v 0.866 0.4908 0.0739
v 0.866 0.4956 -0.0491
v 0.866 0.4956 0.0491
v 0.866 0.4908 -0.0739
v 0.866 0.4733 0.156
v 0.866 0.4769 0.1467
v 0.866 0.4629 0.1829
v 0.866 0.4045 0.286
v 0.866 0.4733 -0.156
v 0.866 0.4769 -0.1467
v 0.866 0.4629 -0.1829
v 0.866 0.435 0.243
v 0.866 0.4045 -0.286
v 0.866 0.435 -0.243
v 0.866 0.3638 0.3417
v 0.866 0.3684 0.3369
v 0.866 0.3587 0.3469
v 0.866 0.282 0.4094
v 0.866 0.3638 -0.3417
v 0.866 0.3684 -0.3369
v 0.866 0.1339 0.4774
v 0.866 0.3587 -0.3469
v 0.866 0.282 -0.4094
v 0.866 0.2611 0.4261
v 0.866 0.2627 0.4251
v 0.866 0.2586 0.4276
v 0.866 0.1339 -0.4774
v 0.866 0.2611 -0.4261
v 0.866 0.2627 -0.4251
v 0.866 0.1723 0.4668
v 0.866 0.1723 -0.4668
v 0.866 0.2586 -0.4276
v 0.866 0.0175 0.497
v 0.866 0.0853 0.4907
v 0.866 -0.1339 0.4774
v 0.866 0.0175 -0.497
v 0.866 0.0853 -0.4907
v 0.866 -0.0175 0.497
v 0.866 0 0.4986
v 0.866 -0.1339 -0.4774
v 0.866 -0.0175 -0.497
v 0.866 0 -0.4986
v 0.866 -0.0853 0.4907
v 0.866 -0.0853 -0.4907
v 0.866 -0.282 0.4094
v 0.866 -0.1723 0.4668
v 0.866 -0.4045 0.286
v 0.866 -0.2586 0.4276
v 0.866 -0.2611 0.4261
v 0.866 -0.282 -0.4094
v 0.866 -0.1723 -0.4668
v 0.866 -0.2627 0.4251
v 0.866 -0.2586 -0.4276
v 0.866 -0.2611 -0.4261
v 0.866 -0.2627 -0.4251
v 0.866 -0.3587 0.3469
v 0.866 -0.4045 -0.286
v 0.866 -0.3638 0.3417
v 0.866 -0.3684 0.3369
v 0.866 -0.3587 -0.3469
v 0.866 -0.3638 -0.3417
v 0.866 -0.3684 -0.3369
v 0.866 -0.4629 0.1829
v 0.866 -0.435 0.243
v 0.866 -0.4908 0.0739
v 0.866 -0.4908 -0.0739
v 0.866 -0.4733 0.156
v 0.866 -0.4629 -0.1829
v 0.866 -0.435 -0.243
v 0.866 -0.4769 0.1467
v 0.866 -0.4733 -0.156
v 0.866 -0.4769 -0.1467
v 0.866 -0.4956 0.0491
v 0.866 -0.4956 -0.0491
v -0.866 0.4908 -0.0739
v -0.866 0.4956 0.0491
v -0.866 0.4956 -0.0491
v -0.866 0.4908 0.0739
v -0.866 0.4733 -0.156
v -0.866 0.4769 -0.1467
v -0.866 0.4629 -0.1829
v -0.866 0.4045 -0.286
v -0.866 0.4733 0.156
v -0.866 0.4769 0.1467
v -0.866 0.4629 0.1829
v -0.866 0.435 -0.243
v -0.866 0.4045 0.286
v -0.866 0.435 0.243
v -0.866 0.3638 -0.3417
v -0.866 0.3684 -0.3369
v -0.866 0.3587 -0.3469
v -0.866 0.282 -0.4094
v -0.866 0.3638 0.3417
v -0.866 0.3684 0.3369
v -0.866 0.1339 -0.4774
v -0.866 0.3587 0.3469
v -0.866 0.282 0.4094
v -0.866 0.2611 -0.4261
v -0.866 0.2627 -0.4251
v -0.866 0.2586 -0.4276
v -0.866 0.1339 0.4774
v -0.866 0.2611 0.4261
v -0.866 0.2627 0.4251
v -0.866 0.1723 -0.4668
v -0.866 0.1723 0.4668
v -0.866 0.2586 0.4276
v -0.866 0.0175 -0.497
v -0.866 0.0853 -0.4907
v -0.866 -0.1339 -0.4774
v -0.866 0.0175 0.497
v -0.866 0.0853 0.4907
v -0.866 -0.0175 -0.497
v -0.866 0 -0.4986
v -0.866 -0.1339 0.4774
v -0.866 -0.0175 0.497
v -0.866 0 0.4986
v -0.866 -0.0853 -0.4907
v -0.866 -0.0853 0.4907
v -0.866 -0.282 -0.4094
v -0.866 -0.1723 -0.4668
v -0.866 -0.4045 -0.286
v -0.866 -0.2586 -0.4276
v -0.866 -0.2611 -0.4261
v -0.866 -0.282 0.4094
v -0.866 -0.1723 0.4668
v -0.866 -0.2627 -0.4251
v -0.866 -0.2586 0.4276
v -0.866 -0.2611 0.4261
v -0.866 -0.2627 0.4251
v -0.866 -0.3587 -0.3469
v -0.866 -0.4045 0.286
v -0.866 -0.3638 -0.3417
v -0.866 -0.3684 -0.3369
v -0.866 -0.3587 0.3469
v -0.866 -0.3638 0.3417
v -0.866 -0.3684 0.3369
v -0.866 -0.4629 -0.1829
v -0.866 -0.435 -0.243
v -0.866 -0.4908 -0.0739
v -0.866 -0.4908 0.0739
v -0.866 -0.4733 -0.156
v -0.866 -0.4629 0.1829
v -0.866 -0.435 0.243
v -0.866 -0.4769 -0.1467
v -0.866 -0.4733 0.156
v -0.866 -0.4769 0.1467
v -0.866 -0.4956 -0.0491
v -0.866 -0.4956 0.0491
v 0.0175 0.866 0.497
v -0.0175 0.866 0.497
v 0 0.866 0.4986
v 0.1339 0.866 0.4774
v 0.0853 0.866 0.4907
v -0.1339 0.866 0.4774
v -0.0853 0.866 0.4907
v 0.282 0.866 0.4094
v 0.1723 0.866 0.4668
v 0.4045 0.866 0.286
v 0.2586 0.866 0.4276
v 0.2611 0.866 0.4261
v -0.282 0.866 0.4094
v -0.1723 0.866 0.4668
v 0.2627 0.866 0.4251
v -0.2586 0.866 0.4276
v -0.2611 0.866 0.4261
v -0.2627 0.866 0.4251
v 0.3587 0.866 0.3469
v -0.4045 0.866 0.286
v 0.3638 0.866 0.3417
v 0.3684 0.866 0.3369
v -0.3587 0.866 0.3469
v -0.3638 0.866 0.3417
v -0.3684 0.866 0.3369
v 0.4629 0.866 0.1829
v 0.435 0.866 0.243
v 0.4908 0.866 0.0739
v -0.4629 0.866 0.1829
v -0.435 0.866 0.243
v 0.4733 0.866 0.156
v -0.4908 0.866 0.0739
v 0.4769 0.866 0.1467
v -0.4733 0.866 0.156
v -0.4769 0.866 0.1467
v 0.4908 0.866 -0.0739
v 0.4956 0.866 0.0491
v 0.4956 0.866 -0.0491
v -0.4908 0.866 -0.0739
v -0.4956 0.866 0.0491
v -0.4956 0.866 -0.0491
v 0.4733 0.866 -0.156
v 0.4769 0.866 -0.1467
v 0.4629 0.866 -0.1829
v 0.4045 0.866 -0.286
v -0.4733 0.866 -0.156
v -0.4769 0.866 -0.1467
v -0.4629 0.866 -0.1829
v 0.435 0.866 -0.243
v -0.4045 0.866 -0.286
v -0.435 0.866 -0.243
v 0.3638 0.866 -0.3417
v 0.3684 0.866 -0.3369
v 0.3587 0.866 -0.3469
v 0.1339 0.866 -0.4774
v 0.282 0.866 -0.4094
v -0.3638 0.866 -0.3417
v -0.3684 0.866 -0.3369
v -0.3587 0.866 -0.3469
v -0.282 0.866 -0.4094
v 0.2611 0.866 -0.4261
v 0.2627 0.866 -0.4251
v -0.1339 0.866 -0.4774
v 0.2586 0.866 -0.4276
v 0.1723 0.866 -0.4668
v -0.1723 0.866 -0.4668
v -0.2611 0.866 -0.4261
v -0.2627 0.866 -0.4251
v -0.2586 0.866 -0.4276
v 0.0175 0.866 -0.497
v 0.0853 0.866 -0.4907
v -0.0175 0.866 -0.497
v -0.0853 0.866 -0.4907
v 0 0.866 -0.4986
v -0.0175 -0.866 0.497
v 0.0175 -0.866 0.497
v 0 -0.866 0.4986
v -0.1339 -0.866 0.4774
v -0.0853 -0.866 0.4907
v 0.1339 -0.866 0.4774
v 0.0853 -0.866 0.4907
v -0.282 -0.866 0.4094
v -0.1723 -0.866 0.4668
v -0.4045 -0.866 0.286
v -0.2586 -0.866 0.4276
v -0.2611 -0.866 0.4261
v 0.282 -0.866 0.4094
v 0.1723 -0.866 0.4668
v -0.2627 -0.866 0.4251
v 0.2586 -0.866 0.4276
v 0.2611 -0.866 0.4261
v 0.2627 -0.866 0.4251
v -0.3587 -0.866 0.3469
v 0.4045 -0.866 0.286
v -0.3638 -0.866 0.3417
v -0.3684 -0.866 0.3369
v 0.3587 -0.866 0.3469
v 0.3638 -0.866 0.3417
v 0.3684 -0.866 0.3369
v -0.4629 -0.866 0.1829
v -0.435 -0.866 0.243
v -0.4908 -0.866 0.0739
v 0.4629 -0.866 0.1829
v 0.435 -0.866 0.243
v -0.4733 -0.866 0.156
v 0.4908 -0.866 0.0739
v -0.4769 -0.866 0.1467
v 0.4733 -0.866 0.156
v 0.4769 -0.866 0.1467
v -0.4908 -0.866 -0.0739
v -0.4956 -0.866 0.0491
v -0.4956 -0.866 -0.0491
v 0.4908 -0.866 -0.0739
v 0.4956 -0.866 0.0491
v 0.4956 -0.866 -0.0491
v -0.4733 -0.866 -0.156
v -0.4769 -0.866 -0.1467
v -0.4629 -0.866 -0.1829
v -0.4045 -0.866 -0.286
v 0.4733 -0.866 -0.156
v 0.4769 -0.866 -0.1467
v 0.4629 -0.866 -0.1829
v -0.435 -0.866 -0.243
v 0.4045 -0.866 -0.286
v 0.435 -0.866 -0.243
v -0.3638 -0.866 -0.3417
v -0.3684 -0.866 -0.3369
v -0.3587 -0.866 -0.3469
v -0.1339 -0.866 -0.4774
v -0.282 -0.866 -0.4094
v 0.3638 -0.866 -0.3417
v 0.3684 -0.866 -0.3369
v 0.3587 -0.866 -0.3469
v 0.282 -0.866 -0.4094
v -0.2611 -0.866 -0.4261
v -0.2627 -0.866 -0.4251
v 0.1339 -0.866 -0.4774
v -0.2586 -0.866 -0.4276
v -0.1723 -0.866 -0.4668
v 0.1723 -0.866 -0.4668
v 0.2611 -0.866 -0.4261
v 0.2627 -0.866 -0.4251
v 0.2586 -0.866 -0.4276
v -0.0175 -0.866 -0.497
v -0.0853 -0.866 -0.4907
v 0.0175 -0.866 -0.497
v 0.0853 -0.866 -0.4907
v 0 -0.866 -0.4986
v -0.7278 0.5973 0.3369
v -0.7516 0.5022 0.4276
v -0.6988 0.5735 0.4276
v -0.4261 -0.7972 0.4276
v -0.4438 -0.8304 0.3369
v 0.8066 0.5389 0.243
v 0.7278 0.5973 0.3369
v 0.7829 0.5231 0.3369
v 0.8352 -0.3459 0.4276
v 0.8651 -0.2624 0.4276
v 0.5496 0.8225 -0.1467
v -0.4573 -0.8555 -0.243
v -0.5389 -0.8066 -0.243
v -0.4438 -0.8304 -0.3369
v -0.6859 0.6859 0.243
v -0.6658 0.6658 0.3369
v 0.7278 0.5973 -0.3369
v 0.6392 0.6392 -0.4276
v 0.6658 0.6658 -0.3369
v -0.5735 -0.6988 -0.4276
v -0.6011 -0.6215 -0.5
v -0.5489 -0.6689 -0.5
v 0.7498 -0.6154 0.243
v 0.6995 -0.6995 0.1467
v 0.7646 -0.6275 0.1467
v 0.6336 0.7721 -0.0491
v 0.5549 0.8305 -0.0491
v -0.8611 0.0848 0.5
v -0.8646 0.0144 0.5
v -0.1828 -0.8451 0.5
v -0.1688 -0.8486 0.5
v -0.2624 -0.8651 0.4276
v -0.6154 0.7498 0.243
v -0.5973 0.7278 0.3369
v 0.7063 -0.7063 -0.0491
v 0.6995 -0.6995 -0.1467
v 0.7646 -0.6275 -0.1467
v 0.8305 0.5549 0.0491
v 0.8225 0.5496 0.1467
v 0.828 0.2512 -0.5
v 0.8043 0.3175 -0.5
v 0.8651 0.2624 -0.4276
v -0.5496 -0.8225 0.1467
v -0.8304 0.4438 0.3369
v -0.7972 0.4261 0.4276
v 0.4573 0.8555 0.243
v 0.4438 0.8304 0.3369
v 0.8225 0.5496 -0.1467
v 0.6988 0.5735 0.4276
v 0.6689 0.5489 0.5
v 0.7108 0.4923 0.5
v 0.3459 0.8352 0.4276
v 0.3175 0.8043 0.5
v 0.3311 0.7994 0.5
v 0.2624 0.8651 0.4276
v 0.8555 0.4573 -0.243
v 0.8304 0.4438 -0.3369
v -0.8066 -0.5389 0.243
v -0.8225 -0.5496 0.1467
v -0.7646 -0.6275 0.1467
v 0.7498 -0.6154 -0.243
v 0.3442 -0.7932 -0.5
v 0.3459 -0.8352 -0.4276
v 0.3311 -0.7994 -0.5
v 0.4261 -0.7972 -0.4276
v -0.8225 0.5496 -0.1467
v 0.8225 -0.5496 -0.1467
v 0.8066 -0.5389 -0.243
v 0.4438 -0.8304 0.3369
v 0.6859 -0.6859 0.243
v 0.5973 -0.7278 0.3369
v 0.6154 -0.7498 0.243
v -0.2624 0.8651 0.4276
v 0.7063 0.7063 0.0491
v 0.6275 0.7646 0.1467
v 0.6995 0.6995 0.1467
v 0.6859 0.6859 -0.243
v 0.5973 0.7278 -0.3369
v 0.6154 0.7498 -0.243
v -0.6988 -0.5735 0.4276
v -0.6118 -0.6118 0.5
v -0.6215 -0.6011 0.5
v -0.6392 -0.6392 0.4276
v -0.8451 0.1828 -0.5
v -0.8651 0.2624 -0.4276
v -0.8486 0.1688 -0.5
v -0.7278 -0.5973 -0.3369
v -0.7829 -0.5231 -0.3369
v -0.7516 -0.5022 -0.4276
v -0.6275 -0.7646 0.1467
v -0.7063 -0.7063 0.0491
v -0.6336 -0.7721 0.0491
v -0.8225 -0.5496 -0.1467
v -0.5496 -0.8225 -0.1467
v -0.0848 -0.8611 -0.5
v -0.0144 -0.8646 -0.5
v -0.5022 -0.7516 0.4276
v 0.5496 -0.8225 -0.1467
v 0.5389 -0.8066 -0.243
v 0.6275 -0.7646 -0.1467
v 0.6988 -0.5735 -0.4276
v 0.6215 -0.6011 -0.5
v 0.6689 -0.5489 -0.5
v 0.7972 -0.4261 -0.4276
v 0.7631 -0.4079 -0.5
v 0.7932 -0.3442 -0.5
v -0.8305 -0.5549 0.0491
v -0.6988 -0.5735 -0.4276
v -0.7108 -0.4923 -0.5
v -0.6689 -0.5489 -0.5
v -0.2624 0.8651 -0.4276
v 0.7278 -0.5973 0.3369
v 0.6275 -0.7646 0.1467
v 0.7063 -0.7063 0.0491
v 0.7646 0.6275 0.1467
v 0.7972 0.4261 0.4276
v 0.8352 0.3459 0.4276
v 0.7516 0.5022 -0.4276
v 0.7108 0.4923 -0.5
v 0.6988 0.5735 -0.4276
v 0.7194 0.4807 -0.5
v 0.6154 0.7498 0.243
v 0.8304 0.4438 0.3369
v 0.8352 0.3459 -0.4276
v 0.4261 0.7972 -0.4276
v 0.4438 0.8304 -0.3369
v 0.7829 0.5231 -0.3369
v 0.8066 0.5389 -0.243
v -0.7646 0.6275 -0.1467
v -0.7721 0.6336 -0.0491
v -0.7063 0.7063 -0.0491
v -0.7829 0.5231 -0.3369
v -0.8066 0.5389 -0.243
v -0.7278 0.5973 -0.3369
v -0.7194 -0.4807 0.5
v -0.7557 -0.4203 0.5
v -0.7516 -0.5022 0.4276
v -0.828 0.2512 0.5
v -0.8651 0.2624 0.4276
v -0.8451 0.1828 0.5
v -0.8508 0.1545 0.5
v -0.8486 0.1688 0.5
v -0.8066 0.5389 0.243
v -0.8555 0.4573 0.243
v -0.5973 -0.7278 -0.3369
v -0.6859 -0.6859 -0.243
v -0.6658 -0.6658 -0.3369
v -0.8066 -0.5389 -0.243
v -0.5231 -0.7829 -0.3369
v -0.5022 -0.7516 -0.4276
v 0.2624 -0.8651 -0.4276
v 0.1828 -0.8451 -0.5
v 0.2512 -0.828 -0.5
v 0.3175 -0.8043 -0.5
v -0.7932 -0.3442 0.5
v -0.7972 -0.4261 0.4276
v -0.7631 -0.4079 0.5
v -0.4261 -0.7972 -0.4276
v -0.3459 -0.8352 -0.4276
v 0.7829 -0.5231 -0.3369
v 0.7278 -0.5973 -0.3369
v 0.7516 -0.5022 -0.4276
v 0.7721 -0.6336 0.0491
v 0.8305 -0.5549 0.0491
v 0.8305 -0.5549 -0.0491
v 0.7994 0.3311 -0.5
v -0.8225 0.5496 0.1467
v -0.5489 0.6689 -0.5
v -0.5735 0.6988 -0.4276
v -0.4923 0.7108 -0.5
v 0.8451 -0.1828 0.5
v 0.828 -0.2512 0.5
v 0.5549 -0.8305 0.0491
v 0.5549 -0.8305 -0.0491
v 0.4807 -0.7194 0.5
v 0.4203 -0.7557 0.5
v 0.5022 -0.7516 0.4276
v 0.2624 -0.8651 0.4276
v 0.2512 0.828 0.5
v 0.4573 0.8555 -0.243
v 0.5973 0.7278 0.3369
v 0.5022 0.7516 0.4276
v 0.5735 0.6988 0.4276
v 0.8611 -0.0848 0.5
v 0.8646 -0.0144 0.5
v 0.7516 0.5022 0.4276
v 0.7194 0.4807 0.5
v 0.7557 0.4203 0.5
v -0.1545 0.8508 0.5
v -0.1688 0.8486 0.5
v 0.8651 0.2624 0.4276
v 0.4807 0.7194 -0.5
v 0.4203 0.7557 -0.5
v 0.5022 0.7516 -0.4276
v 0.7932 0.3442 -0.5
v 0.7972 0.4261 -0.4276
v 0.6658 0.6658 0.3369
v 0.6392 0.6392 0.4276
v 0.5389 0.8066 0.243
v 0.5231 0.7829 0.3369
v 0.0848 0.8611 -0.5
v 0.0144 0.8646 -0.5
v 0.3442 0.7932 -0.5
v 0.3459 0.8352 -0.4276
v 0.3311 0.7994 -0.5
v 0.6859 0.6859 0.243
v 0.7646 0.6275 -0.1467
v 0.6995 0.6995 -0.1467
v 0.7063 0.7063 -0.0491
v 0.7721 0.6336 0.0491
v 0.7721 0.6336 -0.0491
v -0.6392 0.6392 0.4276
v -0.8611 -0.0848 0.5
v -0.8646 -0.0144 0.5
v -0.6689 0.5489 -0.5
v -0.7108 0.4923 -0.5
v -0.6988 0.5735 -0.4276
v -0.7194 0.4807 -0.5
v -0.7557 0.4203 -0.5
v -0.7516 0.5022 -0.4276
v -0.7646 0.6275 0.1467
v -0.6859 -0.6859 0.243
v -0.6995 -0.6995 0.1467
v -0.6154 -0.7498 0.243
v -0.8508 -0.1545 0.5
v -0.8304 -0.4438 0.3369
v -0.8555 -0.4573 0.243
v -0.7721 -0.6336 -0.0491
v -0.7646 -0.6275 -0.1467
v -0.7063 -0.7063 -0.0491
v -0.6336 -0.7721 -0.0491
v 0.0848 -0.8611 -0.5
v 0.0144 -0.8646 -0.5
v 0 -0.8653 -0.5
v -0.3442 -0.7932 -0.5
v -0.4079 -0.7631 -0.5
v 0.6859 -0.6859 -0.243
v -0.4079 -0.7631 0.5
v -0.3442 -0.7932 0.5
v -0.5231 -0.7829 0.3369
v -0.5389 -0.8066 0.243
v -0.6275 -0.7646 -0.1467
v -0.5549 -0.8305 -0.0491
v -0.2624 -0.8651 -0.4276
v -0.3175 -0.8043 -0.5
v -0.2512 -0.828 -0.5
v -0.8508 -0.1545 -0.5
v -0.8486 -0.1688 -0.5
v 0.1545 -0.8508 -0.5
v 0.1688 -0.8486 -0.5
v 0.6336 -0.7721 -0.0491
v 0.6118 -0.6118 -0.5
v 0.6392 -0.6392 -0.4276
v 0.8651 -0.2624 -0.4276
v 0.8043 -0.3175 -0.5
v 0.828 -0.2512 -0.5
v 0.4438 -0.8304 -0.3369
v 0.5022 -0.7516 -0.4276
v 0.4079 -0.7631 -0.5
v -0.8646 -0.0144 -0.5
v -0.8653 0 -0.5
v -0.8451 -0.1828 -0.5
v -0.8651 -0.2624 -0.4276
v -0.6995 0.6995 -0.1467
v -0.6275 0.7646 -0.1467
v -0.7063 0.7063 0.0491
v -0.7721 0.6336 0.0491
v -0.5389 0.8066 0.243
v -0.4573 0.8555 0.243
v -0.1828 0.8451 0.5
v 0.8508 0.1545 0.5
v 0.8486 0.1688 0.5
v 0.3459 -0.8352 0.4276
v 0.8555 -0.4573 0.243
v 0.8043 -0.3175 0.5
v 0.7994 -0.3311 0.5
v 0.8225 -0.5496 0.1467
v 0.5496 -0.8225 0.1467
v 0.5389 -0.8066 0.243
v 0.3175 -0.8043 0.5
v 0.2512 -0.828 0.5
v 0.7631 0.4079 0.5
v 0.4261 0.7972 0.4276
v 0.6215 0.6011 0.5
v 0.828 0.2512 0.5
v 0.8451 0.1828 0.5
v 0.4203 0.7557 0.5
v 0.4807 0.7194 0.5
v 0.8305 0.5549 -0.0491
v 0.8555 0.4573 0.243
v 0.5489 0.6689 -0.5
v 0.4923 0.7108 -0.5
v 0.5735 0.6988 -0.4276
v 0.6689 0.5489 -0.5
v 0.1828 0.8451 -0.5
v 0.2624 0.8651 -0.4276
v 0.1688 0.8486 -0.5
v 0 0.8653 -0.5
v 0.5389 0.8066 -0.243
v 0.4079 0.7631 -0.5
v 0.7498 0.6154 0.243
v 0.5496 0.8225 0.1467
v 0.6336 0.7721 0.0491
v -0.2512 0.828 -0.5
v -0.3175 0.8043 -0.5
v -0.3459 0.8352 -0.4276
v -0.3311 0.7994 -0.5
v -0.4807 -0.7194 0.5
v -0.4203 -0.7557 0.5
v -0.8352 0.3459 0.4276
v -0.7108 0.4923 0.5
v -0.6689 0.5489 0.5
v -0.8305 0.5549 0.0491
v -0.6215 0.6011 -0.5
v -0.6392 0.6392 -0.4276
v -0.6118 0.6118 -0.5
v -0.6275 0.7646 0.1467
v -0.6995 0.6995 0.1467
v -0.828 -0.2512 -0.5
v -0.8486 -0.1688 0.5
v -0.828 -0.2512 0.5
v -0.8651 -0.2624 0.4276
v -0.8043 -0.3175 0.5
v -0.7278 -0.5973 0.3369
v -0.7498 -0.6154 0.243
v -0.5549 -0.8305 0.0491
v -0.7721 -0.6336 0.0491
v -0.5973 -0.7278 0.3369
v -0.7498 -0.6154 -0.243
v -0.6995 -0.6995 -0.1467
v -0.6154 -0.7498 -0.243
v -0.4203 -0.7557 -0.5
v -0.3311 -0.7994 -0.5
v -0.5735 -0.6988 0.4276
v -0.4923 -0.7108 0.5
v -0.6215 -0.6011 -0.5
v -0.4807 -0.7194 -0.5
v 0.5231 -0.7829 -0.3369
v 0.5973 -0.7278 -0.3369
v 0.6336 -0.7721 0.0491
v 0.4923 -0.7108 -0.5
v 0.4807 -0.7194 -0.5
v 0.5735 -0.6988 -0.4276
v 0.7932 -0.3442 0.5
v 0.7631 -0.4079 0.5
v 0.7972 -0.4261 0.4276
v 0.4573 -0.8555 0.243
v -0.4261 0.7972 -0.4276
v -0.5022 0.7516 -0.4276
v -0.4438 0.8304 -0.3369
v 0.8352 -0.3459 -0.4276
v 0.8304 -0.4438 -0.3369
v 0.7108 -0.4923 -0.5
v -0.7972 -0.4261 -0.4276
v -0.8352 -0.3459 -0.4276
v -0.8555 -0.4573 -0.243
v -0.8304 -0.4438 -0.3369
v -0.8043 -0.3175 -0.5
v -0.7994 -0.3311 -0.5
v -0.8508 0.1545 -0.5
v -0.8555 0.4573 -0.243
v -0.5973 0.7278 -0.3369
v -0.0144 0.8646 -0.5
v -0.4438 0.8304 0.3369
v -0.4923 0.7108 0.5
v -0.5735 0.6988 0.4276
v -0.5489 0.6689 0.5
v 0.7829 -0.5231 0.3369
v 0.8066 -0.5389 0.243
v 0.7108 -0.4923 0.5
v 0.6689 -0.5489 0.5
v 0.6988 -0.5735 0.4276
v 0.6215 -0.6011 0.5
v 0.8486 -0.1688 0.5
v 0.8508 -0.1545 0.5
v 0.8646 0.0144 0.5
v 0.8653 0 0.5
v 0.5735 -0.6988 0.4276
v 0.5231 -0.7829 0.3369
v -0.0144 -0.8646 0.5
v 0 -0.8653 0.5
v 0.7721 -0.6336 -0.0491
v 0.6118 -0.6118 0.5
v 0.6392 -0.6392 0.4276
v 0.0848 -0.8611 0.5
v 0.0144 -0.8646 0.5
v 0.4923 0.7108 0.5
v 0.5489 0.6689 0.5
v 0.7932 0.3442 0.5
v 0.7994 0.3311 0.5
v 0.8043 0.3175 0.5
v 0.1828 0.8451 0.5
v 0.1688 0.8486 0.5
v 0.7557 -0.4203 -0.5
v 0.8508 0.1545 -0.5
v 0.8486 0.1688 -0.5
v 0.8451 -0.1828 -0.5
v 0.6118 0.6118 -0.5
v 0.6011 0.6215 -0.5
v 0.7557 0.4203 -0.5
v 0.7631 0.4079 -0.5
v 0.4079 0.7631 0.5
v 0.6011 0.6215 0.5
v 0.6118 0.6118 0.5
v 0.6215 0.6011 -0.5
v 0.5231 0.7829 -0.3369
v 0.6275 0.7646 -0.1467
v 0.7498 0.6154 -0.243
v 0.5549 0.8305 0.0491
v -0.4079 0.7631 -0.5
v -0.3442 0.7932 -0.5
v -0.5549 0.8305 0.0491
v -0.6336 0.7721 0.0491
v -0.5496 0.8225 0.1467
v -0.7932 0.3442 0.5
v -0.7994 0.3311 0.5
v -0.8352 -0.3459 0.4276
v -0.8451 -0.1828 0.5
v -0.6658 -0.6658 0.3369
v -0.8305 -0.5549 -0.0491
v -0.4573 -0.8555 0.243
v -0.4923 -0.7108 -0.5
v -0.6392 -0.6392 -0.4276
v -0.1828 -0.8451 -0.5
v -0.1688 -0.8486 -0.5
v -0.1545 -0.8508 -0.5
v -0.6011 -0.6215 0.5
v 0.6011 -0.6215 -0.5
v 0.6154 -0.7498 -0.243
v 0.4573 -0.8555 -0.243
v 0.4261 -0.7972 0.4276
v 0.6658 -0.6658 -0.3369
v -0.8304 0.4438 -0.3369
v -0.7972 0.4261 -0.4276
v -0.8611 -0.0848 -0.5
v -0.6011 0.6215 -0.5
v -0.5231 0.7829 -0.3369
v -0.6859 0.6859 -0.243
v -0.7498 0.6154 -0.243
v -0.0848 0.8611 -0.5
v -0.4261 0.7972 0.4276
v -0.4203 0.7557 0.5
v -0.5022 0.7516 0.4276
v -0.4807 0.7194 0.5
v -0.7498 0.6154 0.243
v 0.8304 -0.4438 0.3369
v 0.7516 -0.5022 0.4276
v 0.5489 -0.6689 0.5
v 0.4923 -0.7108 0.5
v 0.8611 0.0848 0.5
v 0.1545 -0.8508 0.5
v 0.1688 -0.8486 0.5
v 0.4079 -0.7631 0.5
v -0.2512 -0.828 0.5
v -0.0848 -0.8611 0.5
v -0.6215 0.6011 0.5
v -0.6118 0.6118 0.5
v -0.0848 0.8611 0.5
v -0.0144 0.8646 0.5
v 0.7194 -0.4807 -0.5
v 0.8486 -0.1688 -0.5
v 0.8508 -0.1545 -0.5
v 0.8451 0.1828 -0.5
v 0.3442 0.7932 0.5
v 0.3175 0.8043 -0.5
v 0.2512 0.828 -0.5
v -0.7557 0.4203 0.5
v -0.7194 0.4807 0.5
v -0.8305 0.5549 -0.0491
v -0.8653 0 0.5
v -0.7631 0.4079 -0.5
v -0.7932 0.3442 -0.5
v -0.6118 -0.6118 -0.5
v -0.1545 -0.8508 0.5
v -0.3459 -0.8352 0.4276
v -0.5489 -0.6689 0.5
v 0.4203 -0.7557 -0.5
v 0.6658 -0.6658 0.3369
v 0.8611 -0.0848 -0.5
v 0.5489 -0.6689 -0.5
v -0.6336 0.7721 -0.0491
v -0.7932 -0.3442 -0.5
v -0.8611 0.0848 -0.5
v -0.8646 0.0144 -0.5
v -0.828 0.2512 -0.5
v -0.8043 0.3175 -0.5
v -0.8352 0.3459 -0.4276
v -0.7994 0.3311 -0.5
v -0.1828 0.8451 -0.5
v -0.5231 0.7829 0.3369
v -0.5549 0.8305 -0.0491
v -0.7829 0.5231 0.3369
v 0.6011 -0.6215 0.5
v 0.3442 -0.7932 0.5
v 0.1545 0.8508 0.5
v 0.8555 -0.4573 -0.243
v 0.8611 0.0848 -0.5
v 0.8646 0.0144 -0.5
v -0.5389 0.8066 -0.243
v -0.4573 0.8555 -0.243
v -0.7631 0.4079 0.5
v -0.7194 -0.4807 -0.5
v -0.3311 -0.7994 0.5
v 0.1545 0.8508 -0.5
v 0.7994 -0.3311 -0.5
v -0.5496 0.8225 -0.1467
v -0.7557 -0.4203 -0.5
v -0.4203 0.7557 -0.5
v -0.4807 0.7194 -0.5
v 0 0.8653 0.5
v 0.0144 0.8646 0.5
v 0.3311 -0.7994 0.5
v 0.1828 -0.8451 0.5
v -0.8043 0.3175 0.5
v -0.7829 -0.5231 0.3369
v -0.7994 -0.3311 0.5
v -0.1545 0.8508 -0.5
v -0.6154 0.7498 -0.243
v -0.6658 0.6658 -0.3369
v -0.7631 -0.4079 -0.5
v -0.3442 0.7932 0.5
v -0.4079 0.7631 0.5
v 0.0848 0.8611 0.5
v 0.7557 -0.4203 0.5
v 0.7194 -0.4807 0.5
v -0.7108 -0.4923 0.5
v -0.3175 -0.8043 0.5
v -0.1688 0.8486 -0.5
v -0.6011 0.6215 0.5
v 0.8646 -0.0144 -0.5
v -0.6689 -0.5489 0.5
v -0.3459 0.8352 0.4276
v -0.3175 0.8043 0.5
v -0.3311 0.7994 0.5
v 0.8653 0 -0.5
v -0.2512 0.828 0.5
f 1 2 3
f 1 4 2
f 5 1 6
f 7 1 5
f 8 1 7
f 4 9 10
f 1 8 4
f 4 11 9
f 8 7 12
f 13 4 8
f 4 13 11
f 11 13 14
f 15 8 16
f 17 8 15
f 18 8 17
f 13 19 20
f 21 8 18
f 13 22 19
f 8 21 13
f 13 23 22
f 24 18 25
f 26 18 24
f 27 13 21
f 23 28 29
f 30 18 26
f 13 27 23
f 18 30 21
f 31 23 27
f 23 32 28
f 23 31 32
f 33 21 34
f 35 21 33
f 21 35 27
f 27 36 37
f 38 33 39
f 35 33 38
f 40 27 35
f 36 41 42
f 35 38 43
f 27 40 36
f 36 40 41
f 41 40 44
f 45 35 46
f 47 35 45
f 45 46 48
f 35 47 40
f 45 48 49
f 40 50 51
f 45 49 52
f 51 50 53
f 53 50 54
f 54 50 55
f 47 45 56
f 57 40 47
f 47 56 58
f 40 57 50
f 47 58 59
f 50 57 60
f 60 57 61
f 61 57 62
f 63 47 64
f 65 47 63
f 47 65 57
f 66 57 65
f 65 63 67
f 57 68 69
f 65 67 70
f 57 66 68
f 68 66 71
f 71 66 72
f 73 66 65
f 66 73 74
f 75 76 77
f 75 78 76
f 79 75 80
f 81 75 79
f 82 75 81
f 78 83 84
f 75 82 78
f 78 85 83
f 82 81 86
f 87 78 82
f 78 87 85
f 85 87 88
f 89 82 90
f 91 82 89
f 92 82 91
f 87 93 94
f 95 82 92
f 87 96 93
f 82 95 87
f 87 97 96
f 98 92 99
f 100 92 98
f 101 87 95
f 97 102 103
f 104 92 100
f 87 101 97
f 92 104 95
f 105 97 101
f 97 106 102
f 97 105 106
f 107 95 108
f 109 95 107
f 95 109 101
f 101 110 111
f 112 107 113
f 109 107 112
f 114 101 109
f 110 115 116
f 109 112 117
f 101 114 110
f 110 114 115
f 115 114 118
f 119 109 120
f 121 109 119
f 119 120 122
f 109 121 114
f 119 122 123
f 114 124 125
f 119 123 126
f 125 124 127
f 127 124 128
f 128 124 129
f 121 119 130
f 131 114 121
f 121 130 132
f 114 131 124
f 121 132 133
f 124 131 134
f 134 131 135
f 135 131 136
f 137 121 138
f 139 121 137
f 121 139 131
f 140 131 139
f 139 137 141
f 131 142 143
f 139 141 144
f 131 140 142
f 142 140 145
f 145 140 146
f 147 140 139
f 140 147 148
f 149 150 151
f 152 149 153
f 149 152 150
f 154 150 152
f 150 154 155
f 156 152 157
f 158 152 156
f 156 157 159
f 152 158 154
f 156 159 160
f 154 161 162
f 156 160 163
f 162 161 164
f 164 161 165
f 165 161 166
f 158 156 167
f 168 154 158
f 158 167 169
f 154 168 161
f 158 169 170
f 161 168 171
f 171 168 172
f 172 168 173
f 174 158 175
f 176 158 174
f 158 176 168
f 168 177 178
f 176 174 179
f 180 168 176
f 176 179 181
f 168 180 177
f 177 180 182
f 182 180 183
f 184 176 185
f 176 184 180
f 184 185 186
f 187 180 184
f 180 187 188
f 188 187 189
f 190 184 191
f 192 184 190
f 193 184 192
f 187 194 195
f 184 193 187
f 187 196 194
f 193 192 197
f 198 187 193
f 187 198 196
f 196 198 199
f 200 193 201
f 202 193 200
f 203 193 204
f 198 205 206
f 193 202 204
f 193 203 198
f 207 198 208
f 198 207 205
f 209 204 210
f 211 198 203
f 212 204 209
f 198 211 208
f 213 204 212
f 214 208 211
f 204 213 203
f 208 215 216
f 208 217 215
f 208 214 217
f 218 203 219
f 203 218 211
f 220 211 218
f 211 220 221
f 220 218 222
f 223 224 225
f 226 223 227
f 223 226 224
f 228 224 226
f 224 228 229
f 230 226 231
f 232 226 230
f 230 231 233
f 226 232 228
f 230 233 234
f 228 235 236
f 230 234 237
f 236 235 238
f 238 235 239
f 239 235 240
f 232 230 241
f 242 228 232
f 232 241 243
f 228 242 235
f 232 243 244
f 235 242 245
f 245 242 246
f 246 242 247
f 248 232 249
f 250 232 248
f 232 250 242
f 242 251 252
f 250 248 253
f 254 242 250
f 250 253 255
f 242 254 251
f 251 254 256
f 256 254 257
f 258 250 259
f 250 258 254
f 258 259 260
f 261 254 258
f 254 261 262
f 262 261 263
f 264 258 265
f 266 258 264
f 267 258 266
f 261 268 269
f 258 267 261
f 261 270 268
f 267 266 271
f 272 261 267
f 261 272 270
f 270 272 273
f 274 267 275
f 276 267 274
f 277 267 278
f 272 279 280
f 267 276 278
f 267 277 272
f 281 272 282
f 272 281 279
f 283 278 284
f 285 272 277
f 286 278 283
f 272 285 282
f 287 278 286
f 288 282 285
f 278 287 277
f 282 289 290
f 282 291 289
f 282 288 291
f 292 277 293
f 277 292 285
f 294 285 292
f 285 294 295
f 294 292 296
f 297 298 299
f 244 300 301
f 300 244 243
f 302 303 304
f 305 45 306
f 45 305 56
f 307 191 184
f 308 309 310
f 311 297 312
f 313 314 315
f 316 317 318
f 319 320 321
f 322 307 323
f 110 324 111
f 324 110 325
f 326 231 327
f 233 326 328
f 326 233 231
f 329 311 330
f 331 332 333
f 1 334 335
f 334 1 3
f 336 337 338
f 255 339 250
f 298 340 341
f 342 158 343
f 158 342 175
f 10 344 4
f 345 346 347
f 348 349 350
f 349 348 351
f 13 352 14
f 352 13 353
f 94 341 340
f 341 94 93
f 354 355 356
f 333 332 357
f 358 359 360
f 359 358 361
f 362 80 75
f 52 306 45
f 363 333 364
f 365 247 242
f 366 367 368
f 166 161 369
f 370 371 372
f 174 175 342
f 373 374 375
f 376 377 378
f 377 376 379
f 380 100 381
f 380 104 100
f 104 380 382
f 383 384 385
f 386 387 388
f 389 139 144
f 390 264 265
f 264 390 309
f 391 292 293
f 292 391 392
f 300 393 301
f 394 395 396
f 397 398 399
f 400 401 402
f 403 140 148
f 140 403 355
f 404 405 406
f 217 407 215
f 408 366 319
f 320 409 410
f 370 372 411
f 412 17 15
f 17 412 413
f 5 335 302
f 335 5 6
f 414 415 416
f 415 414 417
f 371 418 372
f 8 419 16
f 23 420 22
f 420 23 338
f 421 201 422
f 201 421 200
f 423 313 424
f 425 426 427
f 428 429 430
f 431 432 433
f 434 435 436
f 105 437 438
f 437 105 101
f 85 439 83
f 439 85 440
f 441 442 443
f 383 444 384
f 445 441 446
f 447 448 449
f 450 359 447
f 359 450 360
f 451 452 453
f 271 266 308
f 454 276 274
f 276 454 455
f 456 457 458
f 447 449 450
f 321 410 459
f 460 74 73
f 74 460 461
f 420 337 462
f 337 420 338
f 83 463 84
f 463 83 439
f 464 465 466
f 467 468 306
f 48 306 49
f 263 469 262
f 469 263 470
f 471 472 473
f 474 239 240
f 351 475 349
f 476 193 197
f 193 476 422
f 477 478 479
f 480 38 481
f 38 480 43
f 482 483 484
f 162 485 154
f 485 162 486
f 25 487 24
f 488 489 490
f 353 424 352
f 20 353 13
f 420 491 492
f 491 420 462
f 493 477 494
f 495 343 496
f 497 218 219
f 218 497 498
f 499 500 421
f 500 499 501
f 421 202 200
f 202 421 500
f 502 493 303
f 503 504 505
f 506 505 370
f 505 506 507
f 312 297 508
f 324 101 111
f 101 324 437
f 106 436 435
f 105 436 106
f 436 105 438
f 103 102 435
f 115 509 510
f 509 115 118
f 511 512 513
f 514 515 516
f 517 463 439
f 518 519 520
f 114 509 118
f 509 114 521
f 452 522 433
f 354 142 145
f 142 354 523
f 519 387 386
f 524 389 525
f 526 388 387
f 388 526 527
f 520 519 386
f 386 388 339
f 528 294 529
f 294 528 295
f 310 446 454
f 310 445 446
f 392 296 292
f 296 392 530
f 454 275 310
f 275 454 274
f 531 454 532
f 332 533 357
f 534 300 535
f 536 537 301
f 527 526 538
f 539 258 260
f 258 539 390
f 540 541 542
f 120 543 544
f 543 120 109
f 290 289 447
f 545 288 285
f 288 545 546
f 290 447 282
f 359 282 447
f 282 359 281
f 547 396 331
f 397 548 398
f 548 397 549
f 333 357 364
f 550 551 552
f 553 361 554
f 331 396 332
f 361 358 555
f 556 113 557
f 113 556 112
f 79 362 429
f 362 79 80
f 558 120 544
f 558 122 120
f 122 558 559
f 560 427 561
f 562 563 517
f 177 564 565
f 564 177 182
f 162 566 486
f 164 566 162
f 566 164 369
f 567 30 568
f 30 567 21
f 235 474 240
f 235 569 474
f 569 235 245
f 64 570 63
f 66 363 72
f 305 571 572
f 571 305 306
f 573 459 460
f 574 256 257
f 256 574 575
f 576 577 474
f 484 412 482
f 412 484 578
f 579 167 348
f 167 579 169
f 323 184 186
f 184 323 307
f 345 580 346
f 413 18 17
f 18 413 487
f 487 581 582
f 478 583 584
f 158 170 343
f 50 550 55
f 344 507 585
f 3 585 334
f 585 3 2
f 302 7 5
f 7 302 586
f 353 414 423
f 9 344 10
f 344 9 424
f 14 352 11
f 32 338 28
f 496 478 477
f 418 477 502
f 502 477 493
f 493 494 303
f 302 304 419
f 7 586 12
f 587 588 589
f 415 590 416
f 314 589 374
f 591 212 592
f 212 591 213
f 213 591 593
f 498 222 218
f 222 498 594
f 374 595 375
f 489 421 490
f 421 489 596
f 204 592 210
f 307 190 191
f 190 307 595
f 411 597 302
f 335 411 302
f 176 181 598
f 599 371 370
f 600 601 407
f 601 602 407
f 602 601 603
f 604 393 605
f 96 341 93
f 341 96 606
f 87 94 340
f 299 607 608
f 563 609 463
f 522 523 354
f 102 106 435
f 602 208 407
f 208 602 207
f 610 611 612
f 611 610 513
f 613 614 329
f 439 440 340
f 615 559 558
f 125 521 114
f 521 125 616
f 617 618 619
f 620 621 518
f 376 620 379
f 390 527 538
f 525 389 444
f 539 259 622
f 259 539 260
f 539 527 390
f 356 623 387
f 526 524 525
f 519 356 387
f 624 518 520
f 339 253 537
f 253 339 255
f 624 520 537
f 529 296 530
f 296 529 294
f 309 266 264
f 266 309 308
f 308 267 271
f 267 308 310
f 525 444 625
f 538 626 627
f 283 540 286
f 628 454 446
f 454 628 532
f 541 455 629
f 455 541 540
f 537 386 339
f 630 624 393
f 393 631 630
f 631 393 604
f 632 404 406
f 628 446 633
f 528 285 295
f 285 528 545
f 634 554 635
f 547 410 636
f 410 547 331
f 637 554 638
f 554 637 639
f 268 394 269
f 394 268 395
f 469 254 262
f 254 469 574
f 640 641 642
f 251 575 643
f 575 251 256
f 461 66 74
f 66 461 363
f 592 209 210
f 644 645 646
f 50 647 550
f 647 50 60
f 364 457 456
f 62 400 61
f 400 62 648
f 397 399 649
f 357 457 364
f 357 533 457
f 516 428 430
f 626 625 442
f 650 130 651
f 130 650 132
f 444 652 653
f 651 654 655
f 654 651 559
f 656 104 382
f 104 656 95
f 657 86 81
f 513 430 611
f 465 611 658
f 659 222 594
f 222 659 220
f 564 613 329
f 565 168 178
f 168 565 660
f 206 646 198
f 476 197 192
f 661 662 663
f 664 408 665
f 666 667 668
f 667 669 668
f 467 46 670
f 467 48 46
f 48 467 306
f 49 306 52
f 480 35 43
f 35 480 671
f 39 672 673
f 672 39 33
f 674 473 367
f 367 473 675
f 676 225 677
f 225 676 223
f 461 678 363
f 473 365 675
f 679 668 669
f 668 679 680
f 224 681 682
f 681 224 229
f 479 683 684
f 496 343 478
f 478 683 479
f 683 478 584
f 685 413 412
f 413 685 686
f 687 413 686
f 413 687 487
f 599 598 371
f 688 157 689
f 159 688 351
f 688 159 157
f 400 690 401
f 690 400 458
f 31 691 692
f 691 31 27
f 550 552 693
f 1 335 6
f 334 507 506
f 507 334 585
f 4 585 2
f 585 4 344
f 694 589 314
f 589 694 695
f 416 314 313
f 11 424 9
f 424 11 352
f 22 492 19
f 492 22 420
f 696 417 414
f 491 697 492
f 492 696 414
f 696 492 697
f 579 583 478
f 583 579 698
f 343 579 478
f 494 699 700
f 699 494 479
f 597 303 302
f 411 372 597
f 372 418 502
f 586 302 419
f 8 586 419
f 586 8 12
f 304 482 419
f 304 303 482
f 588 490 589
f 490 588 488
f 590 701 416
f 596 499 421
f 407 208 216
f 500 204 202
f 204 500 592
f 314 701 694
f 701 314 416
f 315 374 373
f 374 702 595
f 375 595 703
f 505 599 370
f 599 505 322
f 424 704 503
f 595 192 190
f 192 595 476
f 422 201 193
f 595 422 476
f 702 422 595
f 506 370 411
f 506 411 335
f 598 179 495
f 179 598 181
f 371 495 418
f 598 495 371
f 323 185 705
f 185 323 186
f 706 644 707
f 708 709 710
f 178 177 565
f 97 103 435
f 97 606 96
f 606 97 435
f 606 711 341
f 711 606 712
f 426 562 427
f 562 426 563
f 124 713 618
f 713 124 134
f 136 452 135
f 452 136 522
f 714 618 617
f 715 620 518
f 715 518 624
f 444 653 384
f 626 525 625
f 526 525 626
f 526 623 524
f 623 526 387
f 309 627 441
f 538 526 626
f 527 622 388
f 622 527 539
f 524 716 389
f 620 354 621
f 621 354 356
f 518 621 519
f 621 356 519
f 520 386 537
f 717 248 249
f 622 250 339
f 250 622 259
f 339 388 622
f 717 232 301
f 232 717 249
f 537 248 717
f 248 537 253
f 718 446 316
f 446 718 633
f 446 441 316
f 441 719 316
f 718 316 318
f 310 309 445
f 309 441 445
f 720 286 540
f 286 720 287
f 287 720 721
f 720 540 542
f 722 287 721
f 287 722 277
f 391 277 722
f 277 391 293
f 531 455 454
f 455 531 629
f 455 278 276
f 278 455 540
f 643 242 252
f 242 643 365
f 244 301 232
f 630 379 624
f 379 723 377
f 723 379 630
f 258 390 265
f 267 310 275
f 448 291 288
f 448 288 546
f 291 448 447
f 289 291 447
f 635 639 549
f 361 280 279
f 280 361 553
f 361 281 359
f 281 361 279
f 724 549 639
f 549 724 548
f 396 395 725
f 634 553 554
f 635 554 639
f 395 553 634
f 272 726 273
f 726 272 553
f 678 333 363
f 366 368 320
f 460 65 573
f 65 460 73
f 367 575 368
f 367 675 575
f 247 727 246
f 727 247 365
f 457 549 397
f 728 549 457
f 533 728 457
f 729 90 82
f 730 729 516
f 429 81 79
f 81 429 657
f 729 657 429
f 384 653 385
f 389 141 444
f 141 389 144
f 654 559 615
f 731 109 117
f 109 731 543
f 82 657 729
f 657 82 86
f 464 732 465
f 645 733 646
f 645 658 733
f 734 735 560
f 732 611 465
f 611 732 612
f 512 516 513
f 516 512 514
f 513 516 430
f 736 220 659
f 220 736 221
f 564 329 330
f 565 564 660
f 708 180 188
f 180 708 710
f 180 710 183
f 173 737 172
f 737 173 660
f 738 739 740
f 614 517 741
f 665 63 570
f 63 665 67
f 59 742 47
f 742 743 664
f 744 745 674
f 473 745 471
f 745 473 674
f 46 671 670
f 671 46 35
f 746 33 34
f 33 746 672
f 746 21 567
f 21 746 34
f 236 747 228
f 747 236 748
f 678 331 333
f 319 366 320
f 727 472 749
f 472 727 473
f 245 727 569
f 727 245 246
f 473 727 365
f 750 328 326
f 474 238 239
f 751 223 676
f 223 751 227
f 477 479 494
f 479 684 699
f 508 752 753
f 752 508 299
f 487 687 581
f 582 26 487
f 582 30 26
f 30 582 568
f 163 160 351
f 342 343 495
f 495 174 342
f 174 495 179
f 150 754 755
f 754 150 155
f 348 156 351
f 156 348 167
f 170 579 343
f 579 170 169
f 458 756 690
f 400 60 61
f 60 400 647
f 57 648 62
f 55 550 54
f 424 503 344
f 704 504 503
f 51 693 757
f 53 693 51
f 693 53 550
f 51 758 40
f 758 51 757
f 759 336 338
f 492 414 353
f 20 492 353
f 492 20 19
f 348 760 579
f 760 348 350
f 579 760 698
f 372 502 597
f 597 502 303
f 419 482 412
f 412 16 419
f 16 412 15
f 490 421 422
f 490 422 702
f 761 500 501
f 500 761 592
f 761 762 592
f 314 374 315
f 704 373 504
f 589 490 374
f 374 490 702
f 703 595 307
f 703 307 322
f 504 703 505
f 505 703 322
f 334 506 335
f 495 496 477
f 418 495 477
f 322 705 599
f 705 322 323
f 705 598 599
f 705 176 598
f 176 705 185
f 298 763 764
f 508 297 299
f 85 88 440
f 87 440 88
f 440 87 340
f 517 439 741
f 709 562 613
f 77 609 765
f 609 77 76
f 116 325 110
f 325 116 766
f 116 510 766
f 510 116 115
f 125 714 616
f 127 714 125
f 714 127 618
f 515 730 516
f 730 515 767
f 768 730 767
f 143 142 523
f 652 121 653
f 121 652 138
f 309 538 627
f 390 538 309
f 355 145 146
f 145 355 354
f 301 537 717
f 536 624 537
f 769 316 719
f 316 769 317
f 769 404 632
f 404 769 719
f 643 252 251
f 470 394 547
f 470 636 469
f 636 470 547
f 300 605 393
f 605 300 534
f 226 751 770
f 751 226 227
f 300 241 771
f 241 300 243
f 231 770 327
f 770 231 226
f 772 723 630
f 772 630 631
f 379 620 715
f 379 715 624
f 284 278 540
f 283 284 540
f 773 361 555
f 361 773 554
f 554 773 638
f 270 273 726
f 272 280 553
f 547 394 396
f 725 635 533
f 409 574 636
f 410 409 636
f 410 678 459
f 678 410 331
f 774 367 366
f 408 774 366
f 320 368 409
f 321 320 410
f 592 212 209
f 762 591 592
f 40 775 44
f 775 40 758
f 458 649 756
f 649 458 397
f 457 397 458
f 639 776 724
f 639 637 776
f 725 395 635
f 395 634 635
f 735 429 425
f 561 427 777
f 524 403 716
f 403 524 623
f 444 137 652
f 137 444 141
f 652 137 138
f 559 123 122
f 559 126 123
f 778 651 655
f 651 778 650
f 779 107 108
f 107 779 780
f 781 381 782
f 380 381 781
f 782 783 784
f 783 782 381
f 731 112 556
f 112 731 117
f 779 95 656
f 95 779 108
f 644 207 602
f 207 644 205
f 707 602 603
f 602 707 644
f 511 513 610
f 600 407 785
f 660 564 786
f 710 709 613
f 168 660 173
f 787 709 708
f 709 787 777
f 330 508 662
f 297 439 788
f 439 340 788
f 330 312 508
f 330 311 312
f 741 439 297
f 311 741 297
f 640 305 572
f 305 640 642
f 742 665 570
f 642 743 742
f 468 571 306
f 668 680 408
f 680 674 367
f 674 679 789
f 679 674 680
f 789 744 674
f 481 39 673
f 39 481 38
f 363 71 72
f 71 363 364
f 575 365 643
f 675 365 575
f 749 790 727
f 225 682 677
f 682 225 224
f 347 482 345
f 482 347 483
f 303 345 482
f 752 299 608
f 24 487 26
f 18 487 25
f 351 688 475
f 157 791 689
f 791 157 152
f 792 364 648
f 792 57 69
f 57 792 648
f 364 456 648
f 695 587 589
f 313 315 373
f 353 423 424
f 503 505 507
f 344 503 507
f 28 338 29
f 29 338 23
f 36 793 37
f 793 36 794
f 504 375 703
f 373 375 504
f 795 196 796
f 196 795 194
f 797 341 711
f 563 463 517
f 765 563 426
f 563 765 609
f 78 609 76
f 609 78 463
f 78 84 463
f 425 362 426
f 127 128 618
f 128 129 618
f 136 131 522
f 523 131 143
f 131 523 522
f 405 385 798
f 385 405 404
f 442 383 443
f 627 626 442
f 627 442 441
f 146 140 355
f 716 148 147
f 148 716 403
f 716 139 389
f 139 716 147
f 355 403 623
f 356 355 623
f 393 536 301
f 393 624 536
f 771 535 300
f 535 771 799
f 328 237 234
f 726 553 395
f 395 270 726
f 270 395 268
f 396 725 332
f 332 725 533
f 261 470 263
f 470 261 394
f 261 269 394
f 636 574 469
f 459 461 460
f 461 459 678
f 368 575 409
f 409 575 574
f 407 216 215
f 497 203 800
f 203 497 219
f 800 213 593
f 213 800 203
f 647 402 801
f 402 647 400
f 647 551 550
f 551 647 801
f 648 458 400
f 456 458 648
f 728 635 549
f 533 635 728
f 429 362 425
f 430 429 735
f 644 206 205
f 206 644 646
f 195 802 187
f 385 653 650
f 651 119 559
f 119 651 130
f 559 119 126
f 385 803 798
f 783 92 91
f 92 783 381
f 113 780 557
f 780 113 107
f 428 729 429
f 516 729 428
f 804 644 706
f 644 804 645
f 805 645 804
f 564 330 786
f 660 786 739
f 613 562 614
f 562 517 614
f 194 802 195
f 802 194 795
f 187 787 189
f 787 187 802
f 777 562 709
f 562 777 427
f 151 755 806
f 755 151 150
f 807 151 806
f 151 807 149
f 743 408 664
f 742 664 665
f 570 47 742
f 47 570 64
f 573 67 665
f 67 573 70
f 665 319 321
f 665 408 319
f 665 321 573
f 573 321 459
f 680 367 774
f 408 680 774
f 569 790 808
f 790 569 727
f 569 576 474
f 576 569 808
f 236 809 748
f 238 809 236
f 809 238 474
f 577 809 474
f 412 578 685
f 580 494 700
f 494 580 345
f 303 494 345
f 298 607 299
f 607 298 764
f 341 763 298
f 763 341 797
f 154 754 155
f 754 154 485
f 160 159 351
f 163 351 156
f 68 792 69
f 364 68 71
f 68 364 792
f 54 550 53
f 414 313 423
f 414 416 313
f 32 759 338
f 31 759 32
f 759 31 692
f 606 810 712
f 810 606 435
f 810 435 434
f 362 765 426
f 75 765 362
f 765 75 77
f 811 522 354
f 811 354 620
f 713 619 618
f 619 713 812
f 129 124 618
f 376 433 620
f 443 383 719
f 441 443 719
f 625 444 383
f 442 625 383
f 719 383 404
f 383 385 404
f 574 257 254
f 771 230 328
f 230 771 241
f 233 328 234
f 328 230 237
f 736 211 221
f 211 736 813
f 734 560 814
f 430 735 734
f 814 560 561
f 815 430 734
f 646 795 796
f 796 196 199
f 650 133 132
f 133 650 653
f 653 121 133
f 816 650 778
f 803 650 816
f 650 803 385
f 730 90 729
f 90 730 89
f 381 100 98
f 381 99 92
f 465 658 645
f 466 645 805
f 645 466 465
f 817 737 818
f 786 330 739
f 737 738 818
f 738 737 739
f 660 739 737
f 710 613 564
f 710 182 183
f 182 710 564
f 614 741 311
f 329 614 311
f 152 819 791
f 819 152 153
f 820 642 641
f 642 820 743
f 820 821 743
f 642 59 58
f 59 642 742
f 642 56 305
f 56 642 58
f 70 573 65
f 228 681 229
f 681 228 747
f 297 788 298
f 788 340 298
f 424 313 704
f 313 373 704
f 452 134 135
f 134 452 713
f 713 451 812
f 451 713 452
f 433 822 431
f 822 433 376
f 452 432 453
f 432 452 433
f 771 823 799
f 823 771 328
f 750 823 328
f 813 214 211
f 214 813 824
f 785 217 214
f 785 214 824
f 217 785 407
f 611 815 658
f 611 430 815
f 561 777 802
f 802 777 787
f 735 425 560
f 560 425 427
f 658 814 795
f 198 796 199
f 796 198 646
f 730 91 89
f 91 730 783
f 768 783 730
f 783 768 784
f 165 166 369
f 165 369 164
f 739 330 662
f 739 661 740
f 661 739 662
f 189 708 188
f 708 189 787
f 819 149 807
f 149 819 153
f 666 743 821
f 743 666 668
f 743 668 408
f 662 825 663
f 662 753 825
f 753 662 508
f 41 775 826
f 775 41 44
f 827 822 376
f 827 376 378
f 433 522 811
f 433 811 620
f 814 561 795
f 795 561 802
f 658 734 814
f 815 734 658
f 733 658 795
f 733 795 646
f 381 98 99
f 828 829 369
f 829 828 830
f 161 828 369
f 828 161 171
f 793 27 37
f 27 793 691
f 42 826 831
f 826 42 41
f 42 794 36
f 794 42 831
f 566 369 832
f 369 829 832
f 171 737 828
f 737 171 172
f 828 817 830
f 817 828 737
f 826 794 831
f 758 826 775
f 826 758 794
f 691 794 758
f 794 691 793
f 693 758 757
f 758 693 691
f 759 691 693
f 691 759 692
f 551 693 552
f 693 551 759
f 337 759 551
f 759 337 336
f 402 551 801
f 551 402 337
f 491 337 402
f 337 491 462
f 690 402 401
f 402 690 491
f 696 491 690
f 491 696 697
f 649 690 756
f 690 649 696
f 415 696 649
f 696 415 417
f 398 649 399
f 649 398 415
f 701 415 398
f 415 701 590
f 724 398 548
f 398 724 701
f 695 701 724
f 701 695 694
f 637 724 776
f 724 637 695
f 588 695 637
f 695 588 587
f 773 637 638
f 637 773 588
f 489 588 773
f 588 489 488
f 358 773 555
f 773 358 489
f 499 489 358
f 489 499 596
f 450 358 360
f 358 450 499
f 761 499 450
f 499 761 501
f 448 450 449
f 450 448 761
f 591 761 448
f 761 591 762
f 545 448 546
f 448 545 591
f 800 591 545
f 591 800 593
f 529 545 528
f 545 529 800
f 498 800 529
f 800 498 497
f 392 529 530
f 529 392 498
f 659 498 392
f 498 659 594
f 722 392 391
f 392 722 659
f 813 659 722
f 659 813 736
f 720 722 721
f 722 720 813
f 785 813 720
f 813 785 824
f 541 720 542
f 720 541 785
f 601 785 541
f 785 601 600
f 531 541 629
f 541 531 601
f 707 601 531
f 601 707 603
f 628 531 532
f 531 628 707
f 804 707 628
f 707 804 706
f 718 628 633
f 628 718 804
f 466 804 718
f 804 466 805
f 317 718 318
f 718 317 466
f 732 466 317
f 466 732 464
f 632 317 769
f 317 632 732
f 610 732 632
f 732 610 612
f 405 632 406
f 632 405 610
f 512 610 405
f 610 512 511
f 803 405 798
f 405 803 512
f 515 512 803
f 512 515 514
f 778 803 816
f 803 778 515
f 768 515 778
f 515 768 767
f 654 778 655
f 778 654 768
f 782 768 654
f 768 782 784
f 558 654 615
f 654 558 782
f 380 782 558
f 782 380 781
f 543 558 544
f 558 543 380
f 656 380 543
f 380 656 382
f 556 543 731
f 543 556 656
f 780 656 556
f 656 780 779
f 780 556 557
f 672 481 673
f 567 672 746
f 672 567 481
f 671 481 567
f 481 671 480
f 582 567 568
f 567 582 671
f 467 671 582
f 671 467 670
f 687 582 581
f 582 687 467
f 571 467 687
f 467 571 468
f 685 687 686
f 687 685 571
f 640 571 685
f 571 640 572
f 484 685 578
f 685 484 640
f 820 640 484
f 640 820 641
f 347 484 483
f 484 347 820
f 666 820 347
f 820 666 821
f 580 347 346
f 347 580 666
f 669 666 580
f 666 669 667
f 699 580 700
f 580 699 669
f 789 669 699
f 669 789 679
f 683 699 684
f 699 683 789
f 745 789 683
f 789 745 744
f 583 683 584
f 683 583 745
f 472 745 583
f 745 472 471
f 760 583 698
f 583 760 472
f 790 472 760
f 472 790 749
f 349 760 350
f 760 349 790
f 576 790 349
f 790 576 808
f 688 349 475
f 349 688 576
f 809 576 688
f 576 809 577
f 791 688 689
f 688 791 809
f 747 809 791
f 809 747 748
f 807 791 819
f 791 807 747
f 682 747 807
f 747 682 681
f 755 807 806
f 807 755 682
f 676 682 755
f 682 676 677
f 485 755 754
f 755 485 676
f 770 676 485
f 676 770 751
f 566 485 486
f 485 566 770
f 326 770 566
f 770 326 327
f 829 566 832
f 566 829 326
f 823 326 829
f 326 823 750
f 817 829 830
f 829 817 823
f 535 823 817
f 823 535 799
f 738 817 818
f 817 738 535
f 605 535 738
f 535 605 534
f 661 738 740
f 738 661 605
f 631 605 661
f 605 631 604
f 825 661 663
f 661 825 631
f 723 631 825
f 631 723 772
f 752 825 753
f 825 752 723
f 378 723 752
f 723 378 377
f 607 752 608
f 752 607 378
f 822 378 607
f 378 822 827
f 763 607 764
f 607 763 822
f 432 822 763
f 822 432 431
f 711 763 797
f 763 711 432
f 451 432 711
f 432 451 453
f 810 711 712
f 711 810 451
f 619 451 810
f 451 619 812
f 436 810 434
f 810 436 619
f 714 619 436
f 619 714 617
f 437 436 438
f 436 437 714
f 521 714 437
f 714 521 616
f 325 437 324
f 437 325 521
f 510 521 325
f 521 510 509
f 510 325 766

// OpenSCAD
// by Les Hall
// started Sun May 11 2014
// 


$fn=64;
//union()
//difference()
intersection()
{
	cube(size=sqrt(3), center=true);
	sphere();
	cylinder(center=true);
}
